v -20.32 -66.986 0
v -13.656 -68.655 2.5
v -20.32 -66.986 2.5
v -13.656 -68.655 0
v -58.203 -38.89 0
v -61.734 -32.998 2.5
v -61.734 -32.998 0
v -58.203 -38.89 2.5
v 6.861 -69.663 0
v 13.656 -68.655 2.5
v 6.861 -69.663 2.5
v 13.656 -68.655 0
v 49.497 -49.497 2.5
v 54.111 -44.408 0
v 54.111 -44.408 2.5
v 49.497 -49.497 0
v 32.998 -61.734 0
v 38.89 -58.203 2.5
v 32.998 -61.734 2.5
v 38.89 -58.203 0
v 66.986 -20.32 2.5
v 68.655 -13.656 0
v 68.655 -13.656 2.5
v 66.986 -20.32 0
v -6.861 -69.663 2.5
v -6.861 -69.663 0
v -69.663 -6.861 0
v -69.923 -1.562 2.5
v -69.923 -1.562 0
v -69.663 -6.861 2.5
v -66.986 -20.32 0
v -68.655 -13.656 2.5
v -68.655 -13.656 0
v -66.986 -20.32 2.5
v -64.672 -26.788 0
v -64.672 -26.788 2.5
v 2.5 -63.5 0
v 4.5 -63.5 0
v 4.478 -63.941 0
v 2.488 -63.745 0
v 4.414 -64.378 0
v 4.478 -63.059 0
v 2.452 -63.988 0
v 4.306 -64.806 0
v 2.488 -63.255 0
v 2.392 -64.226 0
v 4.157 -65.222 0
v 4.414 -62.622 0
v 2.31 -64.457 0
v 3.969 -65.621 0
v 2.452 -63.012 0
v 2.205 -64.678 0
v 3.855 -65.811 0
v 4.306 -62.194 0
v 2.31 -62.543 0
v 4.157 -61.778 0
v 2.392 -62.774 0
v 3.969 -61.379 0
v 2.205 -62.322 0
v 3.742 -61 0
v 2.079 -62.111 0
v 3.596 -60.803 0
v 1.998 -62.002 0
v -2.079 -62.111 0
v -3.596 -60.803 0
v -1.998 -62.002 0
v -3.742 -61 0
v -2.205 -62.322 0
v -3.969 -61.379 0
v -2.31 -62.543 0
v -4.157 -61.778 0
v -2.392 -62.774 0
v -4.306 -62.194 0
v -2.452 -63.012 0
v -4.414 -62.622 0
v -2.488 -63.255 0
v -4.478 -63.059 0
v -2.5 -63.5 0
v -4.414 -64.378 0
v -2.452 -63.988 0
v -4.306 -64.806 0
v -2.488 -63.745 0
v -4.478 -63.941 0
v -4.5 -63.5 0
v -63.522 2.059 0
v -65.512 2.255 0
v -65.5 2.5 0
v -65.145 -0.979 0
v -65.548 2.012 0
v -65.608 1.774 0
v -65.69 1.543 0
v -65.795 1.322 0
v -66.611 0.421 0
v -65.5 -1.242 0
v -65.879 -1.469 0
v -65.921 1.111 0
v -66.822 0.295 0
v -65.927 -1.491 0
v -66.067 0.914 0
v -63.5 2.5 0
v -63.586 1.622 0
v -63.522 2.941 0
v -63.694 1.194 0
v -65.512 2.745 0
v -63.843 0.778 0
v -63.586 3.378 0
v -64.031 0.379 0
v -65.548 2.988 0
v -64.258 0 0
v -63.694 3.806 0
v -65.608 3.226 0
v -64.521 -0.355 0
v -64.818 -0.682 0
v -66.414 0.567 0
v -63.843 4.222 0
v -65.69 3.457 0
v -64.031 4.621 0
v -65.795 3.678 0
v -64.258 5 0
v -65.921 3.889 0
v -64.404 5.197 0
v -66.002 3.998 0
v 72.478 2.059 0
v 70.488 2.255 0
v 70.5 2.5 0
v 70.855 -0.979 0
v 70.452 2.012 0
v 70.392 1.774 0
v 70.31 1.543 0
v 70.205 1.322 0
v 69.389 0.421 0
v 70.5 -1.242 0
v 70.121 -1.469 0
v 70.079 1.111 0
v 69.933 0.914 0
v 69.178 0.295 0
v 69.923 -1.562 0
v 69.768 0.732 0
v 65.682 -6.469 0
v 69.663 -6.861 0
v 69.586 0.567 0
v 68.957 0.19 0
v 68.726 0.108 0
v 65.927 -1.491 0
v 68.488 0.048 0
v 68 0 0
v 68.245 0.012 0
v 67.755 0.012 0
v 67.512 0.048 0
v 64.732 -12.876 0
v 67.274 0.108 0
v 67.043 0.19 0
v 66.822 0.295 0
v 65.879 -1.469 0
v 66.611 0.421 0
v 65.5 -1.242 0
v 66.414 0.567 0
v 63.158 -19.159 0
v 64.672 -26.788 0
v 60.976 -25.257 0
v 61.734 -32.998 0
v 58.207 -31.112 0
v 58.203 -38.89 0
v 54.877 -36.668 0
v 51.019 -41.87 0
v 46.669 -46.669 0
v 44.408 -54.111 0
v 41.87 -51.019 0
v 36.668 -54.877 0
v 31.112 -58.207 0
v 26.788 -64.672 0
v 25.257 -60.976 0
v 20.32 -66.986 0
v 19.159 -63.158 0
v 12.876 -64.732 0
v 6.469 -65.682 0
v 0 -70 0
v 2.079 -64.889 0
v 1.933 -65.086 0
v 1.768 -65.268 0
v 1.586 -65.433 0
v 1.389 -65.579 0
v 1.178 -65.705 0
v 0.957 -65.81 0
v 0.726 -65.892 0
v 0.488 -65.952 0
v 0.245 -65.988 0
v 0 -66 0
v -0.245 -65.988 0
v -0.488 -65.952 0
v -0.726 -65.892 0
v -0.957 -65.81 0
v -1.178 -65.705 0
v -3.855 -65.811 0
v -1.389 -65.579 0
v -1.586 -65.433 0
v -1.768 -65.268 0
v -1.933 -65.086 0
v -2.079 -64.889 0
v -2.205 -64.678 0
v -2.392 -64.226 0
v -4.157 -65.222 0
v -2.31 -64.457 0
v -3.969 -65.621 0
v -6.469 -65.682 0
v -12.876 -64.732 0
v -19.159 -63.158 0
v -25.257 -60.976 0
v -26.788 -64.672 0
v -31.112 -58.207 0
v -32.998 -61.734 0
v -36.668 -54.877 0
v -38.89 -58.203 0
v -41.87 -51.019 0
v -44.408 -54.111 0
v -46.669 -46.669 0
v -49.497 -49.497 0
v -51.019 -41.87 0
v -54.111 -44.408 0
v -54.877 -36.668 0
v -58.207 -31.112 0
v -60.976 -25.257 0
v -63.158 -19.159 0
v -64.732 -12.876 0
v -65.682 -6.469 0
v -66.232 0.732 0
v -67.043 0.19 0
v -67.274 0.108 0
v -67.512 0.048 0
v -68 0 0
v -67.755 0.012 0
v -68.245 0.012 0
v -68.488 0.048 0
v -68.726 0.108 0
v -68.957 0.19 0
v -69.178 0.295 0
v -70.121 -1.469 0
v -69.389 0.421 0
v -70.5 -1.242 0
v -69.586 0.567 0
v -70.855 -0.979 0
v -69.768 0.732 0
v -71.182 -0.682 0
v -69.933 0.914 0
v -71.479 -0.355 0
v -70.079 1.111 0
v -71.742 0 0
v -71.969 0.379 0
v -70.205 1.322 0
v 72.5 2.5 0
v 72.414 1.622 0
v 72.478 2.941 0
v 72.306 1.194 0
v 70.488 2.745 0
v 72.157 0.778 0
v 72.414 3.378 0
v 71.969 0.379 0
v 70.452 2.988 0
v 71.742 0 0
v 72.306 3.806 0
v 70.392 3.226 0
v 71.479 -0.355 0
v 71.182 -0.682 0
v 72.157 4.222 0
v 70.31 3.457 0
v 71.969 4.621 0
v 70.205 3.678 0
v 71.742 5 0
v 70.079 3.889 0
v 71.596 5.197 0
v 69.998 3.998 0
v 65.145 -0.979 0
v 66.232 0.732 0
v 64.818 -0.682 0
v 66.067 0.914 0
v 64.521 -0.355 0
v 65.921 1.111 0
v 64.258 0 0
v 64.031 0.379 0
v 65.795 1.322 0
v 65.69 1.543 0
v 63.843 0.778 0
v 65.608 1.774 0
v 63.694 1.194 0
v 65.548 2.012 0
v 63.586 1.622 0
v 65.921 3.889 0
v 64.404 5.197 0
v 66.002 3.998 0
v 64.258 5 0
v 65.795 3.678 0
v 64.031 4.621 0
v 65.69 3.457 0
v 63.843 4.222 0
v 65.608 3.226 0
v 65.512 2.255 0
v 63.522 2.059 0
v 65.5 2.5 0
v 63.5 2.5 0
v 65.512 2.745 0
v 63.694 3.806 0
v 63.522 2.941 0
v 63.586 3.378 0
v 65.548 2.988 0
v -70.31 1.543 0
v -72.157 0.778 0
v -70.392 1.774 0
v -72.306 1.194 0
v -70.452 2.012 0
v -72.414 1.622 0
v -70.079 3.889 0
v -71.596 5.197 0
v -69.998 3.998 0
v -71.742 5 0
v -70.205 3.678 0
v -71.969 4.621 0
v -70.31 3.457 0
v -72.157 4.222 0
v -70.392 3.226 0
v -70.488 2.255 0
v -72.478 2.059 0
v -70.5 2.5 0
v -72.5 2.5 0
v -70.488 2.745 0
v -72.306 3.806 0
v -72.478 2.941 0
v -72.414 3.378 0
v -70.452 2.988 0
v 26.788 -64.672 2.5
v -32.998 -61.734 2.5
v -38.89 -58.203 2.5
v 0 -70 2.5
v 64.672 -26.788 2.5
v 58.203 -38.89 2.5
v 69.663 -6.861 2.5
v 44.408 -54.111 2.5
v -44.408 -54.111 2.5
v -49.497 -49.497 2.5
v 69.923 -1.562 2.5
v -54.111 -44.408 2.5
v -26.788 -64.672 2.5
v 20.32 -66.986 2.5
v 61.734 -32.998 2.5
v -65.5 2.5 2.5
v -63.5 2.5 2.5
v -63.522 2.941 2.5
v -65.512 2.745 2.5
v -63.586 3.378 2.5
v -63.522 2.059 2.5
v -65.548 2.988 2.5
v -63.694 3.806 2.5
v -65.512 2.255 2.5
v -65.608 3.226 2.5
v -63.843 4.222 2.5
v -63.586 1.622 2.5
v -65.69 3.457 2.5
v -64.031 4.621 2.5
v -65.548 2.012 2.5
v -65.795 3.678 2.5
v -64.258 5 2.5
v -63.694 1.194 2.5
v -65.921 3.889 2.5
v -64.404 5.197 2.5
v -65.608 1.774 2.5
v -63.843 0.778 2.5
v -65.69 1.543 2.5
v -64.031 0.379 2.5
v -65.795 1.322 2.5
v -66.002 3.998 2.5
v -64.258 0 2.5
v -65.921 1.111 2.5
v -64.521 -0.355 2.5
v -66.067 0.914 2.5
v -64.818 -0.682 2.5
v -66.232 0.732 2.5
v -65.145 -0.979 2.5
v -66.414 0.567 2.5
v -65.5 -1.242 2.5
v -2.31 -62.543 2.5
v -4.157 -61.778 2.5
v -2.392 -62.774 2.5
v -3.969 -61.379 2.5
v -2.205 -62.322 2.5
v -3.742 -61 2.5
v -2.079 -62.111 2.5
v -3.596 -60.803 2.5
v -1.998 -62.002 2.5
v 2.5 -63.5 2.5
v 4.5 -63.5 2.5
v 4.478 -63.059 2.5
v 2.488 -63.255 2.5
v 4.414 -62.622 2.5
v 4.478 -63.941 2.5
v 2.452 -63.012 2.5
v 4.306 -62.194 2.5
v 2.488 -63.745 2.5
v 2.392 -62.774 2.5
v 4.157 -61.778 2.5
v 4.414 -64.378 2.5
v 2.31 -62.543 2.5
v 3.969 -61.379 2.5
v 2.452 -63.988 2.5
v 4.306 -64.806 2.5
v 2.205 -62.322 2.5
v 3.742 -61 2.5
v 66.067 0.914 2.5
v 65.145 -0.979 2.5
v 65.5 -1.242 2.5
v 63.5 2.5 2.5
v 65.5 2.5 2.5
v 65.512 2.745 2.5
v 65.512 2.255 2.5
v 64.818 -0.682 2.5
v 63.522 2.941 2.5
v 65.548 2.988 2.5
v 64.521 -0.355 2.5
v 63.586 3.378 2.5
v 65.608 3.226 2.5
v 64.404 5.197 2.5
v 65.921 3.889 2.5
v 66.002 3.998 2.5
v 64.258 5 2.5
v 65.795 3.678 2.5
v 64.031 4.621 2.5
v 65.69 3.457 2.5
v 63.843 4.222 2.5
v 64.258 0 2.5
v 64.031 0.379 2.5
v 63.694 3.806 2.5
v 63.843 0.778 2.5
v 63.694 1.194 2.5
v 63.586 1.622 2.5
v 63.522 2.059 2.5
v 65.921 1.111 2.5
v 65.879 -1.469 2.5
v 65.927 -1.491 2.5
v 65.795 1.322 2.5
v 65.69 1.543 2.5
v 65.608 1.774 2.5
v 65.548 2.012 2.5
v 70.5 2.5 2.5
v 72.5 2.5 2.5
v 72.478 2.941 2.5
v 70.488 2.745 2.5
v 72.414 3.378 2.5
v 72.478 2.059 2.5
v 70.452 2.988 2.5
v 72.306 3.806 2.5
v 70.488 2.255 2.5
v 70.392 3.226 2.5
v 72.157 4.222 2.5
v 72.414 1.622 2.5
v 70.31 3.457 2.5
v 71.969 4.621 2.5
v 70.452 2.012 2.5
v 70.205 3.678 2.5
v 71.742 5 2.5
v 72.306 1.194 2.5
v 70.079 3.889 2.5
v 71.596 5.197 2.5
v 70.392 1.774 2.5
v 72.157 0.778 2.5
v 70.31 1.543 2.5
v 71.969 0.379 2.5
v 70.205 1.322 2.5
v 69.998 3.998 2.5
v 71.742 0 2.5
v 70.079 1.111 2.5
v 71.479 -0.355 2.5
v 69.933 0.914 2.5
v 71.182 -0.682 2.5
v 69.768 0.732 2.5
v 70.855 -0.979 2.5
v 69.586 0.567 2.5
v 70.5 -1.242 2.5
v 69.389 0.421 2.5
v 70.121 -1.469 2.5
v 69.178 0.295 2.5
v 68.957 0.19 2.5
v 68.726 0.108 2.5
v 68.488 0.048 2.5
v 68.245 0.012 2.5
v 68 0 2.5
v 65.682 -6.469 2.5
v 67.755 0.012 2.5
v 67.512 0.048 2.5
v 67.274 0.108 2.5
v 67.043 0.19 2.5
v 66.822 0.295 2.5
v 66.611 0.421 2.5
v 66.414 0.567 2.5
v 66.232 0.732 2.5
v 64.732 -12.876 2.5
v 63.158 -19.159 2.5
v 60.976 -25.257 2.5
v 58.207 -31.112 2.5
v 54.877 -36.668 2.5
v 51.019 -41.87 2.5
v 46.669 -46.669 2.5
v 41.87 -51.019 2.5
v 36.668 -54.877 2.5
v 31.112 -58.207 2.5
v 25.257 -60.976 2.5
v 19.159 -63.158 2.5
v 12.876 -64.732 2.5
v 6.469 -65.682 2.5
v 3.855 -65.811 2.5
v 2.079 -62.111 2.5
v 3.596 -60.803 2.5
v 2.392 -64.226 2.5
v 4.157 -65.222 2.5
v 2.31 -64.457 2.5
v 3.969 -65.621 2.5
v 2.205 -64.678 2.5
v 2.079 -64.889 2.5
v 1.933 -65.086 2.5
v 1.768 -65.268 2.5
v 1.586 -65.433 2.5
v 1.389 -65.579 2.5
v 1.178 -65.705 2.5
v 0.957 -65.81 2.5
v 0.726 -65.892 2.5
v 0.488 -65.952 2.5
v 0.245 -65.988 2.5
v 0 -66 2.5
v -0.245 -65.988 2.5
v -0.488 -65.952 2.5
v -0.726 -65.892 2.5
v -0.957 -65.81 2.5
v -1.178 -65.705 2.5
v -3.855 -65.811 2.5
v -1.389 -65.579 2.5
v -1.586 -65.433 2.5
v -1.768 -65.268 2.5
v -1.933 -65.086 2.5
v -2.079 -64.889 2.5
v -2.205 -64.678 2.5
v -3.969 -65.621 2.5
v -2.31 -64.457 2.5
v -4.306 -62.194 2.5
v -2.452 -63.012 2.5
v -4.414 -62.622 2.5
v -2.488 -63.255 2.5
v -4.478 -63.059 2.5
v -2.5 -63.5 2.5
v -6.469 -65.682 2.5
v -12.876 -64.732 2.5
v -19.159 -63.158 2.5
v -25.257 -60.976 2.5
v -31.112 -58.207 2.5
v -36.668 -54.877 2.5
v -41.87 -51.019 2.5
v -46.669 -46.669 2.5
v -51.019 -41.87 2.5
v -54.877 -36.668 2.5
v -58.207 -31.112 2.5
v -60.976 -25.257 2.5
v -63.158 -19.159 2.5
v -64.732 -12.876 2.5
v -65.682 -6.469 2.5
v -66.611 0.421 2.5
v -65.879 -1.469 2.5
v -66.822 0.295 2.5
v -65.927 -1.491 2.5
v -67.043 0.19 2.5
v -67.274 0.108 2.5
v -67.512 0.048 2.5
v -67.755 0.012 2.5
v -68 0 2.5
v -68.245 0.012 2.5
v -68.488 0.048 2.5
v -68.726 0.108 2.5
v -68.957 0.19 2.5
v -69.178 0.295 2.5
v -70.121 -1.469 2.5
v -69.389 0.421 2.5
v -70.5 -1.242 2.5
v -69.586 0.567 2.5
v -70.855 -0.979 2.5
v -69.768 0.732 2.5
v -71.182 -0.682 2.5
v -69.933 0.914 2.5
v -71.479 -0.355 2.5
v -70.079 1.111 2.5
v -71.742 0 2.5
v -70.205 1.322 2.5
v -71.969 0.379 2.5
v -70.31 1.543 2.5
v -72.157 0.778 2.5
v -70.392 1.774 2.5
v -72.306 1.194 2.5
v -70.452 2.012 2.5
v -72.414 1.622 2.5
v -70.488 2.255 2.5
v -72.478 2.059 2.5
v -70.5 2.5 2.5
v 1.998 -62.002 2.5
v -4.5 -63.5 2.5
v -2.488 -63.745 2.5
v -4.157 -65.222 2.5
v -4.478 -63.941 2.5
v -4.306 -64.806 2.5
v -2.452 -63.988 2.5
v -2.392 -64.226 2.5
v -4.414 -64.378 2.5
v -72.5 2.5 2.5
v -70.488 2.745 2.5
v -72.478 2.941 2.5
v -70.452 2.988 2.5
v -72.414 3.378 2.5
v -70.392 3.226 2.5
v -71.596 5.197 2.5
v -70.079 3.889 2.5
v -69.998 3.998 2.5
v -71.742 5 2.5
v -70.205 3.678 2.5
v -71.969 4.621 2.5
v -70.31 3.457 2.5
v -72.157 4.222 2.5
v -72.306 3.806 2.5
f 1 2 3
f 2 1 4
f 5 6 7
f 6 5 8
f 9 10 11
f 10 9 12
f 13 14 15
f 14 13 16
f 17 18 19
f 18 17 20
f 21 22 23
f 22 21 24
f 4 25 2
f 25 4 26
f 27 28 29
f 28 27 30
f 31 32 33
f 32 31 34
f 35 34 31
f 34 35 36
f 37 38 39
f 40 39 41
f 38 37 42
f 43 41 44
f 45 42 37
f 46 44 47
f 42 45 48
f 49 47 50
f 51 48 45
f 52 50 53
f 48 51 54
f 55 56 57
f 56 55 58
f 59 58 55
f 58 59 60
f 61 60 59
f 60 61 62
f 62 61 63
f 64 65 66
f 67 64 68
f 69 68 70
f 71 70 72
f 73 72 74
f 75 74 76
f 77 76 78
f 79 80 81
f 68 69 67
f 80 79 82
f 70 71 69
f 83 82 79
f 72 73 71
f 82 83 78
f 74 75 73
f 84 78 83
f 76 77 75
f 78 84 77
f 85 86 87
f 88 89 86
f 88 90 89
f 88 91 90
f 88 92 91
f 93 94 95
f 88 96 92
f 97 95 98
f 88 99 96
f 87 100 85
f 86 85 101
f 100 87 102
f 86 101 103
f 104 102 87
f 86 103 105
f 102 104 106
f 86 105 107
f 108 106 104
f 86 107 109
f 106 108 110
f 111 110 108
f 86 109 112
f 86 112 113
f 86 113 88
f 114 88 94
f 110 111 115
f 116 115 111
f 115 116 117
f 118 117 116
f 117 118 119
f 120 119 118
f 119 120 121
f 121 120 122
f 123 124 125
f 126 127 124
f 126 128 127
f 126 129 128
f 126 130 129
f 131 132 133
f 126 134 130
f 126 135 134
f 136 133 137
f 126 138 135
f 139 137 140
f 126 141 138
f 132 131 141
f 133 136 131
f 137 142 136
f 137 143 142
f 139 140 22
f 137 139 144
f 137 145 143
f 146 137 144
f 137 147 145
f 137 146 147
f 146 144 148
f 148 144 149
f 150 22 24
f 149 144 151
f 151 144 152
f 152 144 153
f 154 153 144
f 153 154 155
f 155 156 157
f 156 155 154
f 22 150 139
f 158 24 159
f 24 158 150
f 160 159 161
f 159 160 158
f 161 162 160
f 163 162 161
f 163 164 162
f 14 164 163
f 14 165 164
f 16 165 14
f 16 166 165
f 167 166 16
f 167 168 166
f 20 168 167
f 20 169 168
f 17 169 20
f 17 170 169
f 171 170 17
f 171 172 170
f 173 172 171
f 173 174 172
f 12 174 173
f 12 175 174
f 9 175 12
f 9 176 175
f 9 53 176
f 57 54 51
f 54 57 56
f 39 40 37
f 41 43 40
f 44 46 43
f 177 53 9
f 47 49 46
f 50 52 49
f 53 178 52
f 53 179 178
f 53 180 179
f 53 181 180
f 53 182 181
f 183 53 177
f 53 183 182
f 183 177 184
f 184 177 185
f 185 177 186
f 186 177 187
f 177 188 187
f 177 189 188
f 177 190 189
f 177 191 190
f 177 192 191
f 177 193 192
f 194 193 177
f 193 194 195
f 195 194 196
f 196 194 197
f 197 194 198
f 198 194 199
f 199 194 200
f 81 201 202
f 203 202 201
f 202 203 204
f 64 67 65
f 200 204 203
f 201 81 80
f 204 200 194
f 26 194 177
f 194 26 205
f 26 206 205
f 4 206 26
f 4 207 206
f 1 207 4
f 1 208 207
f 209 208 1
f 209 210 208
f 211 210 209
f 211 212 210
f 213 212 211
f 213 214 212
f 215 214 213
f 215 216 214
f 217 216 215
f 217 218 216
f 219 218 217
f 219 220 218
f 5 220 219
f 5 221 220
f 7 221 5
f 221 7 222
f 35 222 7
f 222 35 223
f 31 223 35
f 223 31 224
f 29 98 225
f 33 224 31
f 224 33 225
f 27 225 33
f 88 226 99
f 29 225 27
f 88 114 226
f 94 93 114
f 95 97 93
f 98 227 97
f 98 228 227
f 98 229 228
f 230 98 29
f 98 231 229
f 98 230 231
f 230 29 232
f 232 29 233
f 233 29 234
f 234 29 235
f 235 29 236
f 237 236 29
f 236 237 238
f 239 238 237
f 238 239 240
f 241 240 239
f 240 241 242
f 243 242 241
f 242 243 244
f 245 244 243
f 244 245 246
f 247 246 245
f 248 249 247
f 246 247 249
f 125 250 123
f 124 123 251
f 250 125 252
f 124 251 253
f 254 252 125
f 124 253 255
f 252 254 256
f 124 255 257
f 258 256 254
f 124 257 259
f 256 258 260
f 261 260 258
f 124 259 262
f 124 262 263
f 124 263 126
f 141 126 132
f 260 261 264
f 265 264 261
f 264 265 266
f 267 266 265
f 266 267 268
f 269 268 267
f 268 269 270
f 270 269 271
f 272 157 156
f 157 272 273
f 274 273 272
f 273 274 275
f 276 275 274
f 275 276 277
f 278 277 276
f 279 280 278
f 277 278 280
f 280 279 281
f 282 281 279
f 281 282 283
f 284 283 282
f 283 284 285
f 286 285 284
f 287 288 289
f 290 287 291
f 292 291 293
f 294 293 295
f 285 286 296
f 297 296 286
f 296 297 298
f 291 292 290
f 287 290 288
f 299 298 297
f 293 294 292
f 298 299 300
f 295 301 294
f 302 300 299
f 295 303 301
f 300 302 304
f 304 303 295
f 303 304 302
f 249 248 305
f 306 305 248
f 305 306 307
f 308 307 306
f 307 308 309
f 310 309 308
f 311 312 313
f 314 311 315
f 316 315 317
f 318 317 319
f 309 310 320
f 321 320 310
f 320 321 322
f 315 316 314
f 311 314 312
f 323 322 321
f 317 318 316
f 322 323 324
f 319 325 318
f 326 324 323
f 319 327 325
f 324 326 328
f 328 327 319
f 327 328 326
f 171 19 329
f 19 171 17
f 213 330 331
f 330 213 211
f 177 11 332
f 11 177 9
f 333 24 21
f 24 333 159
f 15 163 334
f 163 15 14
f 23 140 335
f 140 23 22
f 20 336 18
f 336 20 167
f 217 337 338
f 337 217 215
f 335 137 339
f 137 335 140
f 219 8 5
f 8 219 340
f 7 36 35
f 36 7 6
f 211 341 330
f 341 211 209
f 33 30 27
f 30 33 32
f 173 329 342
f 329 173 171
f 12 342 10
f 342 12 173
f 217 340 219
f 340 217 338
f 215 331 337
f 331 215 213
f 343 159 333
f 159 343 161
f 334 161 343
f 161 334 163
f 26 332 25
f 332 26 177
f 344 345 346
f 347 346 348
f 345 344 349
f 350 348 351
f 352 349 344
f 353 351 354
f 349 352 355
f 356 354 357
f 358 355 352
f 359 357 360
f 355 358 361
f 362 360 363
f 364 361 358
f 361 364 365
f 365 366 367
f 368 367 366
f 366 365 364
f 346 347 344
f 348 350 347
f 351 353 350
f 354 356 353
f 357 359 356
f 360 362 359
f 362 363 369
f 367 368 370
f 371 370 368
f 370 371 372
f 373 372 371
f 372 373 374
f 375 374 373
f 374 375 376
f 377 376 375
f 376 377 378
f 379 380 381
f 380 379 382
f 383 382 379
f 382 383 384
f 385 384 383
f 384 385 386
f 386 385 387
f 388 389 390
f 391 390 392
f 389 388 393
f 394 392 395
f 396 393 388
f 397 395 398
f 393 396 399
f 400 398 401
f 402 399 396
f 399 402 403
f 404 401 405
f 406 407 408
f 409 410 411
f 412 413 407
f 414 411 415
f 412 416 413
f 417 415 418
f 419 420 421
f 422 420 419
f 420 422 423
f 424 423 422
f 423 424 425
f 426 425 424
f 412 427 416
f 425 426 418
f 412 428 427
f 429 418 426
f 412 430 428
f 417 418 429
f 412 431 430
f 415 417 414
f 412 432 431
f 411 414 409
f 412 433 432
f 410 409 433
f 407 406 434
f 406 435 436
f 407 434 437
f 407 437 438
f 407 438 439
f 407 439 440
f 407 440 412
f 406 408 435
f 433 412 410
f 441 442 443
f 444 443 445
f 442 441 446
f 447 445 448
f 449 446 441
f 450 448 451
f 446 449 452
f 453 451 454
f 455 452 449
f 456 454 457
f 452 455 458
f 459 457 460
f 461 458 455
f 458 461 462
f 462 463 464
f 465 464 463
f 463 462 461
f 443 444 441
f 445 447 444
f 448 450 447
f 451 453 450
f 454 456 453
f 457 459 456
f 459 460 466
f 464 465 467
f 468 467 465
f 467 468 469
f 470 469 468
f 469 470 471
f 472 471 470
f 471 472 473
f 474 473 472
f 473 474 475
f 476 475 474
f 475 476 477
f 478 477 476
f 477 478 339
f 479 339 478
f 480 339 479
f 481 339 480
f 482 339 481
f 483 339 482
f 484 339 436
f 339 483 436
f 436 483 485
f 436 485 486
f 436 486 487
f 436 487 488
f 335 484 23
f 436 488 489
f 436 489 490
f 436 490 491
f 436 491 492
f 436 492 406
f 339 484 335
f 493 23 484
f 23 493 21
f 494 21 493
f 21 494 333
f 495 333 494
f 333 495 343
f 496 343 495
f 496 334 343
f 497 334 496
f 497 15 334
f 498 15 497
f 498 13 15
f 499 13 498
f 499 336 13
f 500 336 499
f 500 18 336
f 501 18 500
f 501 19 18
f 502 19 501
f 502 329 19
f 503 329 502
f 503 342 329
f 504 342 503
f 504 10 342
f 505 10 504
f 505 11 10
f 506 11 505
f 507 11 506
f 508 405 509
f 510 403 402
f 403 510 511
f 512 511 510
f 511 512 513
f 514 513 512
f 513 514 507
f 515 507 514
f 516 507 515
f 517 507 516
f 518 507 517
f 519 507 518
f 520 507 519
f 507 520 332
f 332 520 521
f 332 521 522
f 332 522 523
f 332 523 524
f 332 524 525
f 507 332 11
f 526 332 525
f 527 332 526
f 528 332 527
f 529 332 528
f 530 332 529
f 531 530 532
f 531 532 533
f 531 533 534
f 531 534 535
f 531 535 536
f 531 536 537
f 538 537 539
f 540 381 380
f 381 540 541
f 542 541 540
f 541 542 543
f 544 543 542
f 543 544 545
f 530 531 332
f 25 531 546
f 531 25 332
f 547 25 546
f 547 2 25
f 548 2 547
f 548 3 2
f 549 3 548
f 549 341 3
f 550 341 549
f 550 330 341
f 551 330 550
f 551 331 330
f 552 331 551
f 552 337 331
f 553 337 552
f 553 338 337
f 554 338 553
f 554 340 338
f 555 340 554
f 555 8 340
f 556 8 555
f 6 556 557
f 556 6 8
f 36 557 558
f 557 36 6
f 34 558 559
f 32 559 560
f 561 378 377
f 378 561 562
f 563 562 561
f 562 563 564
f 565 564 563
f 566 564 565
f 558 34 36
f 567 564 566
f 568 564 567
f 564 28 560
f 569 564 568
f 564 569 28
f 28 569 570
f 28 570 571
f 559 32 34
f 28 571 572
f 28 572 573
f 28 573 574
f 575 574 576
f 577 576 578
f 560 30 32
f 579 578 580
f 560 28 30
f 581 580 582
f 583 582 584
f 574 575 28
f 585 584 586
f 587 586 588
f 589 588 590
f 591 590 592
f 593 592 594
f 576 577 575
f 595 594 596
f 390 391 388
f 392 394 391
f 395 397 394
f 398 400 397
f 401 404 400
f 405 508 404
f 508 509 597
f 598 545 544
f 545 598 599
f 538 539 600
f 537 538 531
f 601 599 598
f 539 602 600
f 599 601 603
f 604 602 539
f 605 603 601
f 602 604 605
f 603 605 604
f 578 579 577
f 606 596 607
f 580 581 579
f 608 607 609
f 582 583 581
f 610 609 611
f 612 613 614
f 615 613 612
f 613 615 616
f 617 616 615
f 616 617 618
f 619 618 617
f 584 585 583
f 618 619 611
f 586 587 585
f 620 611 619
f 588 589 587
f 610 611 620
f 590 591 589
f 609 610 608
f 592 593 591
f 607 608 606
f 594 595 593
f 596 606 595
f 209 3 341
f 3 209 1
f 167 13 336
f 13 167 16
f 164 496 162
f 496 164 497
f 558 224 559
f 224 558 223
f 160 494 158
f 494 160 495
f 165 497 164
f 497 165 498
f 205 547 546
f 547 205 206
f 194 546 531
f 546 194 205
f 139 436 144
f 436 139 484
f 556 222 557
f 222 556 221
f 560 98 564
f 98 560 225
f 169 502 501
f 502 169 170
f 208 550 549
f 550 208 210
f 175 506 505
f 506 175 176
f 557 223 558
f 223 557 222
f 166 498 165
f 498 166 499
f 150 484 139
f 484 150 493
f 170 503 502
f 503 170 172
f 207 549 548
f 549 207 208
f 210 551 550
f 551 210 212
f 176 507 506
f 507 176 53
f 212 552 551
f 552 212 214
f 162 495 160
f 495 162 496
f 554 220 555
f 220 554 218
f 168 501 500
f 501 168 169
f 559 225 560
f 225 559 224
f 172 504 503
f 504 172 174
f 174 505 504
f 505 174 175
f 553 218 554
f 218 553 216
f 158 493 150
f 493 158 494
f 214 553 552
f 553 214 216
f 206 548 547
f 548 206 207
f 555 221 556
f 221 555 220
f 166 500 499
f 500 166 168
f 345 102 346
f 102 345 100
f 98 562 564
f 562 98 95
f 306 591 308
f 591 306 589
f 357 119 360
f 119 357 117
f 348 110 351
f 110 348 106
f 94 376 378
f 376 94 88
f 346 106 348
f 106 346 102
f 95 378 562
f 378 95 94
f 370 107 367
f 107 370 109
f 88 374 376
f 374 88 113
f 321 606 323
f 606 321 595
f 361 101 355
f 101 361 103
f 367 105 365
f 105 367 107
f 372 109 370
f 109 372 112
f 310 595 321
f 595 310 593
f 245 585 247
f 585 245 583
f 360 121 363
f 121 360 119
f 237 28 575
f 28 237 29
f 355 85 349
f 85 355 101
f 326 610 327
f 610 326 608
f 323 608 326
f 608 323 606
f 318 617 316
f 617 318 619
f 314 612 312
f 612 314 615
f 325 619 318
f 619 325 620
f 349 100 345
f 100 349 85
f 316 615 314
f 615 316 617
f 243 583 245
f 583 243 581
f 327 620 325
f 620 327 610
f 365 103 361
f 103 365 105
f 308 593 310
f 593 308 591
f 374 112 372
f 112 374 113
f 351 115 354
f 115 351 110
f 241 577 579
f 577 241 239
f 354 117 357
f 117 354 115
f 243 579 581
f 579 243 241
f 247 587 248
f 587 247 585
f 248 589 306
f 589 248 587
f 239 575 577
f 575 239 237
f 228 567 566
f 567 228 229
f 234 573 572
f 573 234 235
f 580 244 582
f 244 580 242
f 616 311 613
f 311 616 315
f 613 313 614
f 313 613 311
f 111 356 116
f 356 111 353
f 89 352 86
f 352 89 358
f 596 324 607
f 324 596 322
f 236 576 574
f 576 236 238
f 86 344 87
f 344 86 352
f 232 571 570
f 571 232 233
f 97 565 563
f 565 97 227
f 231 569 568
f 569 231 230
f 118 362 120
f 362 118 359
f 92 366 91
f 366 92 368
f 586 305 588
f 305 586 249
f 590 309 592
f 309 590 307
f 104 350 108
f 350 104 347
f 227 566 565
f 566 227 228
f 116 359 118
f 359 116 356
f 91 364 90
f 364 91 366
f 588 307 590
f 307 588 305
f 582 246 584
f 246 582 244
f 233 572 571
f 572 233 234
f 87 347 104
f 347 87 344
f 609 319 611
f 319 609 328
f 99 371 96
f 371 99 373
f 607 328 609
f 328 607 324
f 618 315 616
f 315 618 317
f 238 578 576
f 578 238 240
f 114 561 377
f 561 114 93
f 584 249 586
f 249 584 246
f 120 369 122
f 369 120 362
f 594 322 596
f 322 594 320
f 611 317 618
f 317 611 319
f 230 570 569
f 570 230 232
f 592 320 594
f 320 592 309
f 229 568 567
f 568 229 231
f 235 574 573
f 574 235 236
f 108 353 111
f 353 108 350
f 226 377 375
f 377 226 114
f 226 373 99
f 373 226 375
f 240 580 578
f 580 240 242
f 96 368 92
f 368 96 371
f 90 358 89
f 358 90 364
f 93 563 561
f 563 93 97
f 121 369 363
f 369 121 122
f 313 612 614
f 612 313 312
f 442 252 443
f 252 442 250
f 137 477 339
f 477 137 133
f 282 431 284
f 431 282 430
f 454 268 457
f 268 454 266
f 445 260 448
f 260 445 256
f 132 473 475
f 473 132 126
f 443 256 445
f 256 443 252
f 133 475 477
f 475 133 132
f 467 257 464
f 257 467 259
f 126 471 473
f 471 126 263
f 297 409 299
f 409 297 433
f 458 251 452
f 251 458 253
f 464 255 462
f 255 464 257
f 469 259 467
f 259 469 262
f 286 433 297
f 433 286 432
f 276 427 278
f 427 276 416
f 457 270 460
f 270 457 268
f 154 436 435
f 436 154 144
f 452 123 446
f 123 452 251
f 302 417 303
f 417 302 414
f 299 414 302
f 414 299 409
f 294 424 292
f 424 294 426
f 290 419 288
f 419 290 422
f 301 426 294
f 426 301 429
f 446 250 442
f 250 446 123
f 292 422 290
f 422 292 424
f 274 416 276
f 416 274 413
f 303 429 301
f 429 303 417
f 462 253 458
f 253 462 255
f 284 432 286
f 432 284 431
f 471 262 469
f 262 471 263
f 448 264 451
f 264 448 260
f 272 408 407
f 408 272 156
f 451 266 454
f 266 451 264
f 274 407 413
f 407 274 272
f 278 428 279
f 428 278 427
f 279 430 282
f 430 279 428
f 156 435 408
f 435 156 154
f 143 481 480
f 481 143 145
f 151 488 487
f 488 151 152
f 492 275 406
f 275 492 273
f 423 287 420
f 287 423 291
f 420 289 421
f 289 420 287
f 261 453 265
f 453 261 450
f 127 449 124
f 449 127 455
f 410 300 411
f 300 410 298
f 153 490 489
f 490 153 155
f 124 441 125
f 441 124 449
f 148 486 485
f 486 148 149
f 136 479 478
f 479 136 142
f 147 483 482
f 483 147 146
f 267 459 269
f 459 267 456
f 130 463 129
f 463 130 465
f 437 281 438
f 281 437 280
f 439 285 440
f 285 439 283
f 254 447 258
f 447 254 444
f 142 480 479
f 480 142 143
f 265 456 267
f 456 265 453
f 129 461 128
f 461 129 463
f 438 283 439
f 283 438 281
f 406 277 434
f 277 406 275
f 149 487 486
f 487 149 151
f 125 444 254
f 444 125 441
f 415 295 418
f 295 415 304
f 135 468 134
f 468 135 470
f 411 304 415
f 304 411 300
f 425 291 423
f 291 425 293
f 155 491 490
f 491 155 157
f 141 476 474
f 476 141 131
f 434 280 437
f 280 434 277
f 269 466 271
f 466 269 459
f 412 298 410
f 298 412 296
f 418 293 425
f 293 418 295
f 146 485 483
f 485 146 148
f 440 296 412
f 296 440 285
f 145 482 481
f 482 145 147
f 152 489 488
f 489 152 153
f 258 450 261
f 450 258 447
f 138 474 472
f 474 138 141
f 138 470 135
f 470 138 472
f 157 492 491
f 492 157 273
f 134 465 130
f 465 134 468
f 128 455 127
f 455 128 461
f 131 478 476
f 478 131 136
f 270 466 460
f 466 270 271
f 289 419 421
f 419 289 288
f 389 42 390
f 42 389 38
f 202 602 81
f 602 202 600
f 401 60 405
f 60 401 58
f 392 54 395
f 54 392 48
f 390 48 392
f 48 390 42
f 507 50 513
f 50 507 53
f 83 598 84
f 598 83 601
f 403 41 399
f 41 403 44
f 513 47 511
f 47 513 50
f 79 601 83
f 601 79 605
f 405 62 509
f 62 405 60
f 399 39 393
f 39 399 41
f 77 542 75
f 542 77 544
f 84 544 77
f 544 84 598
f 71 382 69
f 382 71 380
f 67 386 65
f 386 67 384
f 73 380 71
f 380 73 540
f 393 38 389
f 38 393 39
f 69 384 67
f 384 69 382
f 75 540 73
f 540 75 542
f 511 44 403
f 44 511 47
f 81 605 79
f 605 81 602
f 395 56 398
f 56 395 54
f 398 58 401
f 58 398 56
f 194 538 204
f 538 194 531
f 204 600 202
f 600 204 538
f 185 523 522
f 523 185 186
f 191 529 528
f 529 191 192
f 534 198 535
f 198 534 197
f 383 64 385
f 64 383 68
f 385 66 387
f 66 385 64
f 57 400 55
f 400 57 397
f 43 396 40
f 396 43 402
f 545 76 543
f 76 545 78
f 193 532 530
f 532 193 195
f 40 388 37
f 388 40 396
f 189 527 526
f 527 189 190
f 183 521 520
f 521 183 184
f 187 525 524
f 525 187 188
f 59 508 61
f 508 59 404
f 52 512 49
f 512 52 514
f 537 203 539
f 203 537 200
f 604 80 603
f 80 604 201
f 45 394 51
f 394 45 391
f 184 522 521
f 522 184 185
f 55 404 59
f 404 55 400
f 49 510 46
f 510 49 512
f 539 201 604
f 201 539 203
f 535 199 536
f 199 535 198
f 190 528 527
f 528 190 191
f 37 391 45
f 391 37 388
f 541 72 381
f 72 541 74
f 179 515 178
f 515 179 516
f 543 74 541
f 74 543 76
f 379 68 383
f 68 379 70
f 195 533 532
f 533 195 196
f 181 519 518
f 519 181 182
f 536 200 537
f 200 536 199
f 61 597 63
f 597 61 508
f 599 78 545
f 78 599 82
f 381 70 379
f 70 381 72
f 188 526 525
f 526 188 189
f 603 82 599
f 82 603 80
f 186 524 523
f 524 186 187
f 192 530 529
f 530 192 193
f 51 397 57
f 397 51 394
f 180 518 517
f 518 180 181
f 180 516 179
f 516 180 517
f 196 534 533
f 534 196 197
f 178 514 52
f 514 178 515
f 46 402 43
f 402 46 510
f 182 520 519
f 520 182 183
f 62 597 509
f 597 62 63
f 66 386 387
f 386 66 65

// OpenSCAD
Support_Diameter=140;
Support_Thickness=2.5;
Support_Width=4;
Catch_Diameter=5;
Catch_Opening=0.8*Catch_Diameter;
$fn = 64;
openSCADErr=0.01;


//Generate the main shape of the support
difference()
{
    // Draw a full circle/cylinder of the appropriate dimensions
    cylinder(Support_Thickness,
                Support_Diameter/2,
                Support_Diameter/2);
    
    // Cut-out the interior
    translate( [0,0, -openSCADErr/2] ) 
    cylinder(Support_Thickness + openSCADErr,
                Support_Diameter/2 - Support_Width,
                Support_Diameter/2 - Support_Width);
 
    // Cut one one half of it
    translate( [0,0, -openSCADErr/2] ) 
    translate([-Support_Diameter/2, 0, 0]) 
        cube([Support_Diameter, 
              Support_Diameter/2, 
              Support_Thickness + openSCADErr]);
}

//Left Catch
 place_catch( [ -Support_Diameter/2+Support_Width/2,
                Catch_Diameter/2,
                0]);
//Right Catch
place_catch( [  Support_Diameter/2-Support_Width/2,
                Catch_Diameter/2,
                0]);
//Center Catch
place_catch( [  0,
               -Support_Diameter/2+Support_Width+Catch_Diameter/2,
                0]);


//Function to generate one catch and place it to the given coordinates
module place_catch(catch_postion)
{
    catch_width=Support_Width/2;
    catch_radius=Catch_Diameter/2;
    
    translate(catch_postion)
    {
        rotate([0,0,90]) 
        difference()
            {
                //Start with a circle
                cylinder(Support_Thickness,
                            catch_radius + catch_width,
                            catch_radius + catch_width );
                
                // Cut-out the interior
                translate( [0,0, -openSCADErr/2] ) 
                cylinder(Support_Thickness + openSCADErr,
                            catch_radius,
                            catch_radius);
                
                // Cut the opening using a triangle, so that the circle opening is correct   
                //First we calculate the x,y of one of the tringle points and the slope of
                //the line from the center of the circle to that point
                cut_x=sqrt(pow(catch_radius,2)-pow(Catch_Opening/2,2));
                cut_y=(Catch_Opening)/2;
                slope_abs=cut_y/cut_x;
                //..then we use the slope to draw the points and triange
                translate( [0,0, -openSCADErr/2] ) 
                linear_extrude(Support_Thickness + openSCADErr)
                    polygon([   [0, 0],
                                //[cut_x, cut_y ],    //not actually needed
                                //[cut_x ,-cut_y ],   //not actually needed
                                [catch_radius+catch_width, (catch_radius+catch_width)*slope_abs],
                                [catch_radius+catch_width, -(catch_radius+catch_width)*slope_abs]
                            ], 
                            paths=[[0,1,2]]
                            );

            }
      }   

}
